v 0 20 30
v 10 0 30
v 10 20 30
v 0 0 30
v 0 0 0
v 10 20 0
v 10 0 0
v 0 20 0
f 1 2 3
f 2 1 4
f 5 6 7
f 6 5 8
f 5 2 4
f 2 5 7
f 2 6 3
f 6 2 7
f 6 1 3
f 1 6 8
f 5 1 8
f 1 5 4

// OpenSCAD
// Generated by SolidPython 1.1.3 on 2022-06-05 14:33:14
$fn = 48;


color(alpha = 1.0000000000, c = "red") {
	cube(size = [10, 20, 30]);
}
/***********************************************
*********      SolidPython code:      **********
************************************************
 
import subprocess

from solid.objects import *
from solid import scad_render_to_file

##################################################################################################################################################
##################################################################################################################################################
##################################################################################################################################################
##################################################################################################################################################
######  DIMENSION STUFF
##################################################################################################################################################
##################################################################################################################################################
##################################################################################################################################################
##################################################################################################################################################


mode = "3DPR"
#mode = "LAZE"
#mode = "TURE"
#mode = ""


######  Countersunk
countersunkM = []
WIDTH = 0
DEPTH = 1
countersunkM1width = 0; countersunkM1depth = 0; countersunkM2width = 0; countersunkM2depth = 0
countersunkM3width = 0
countersunkM3depth = 0
countersunkM4width = 0
countersunkM4depth = 0
countersunkM5width = 0
countersunkM5depth = 0
countersunkM6width = 0
countersunkM6depth = 0

######  Holes
holeM = []
holeM1 = 0
holeM2 = 0
holeM3 = 0
holeM4 = 0
holeM5 = 0
holeM6 = 0

######  Nuts
nutM = []
NUTWIDTH = 0
NUTDEPTH = 1
nutM1width = 0
nutM1depth = 0
nutM2width = 0
nutM2depth = 0
nutM3width = 0
nutM3depth = 0
nutM4width = 0
nutM4depth = 0
nutM5width = 0
nutM5depth = 0
nutM6width = 0
nutM6depth = 0

######  OOEB
ooebPinWidth = 0


######  Colors
colDefault = "Gold"

colOOEBbase = colDefault

colLEDRed = "red"
colWire = "gray"
    ######  Resistor
colRes = list()
colResistor = "beige"

colResBlack = "black"
colRes.append(colResBlack)
colResBrown = "brown"
colRes.append(colResBrown)
colResRed = "red"
colRes.append(colResRed)
colResOrange = "orange"
colRes.append(colResOrange)
colResYellow = "yellow"
colRes.append(colResYellow)
colResGreen = "green"
colRes.append(colResGreen)
colResBlue = "blue"
colRes.append(colResBlue)
colResPurple = "purple"
colRes.append(colResPurple)
colResGray = "gray"
colRes.append(colResGray)
colResWhite = "white"
colRes.append(colResWhite)





def changeMode(m="3DPR"):
    #print("####################################################      CHANGING MODES TO: " + m)
    global mode
    mode = m
    ######  Countersunk
    global countersunkM, countersunkM1width, countersunkM1depth, countersunkM2width, countersunkM2depth, countersunkM3width, countersunkM3depth, countersunkM4width, countersunkM4depth, countersunkM5width, countersunkM5depth, countersunkM6width, countersunkM6depth
    countersunkM = []
    countersunkM.append([0,0])
    countersunkM1width = 0 if mode== "3DPR" else 0
    countersunkM1depth = 0 if mode== "3DPR" else 0
    countersunkM.append([countersunkM1width,countersunkM1depth])
    countersunkM2width = 0 if mode== "3DPR" else 0
    countersunkM2depth = 0 if mode== "3DPR" else 0
    countersunkM.append([countersunkM2width,countersunkM2depth])
    countersunkM3width = 5.5/2+0.6 if mode== "3DPR" else 5.5/2
    countersunkM3depth = 1.7 if mode== "3DPR" else 1.7
    countersunkM.append([countersunkM3width,countersunkM3depth])
    countersunkM4width = 0 if mode== "3DPR" else 0
    countersunkM4depth = 0 if mode== "3DPR" else 0
    countersunkM.append([countersunkM4width,countersunkM4depth])
    countersunkM5width = 0 if mode== "3DPR" else 0
    countersunkM5depth = 0 if mode== "3DPR" else 0
    countersunkM.append([countersunkM5width,countersunkM5depth])
    countersunkM6width = 0 if mode== "3DPR" else 0
    countersunkM6depth = 0 if mode== "3DPR" else 0
    countersunkM.append([countersunkM6width,countersunkM6depth])
    ######  Holes
    global holeM, holeM1, holeM2, holeM3, holeM4, holeM5, holeM6, holeM7, holeM8
    holeM = []
    holeM1 = 1.2/2 if mode== "3DPR" else 1/2
    holeM2 = 2.3/2 if mode== "3DPR" else 2/2
    holeM3 = 3.4/2 if mode== "3DPR" else 3/2
    holeM4 = 4.4/2 if mode== "3DPR" else 4/2
    holeM5 = 5.4/2 if mode== "3DPR" else 5/2
    holeM6 = 6.5/2 if mode== "3DPR" else 6/2
    holeM7 = 7.5/2 if mode== "3DPR" else 7/2
    holeM8 = 8.6/2 if mode== "3DPR" else 8/2
    holeM.append(0)
    holeM.append(holeM1)
    holeM.append(holeM2)
    holeM.append(holeM3)
    holeM.append(holeM4)
    holeM.append(holeM5)
    holeM.append(holeM6)
    holeM.append(holeM7)
    holeM.append(holeM8)
    #####  Nuts
    global nutM, nutM1width, nutM1depth, nutM2width, nutM2depth, nutM3width, nutM3depth, nutM4width, nutM4depth, nutM5width, nutM5depth, nutM6width, nutM6depth
    nutM = []
    nutM.append([0,0]) 
    #M1 Nut
    nutM1width = 0
    nutM1depth = 0
    nutM.append([nutM1width,nutM1depth])    
    #M2 Nut
    nutM2width = 0
    nutM2depth = 0
    nutM.append([nutM2width,nutM2depth])    
    #M3 Nut
    nutM3width = 6.05 if mode== "3DPR" else 5.5
    nutM3depth = 2.5 if mode== "3DPR" else 2.5
    nutM.append([nutM3width,nutM3depth])    
    #M4 Nut
    nutM4width = 0
    nutM4depth = 0
    nutM.append([nutM4width,nutM4depth])    
    #M5 Nut
    nutM5width = 0
    nutM5depth = 0
    nutM.append([nutM5width,nutM5depth])    
    #M6 Nut
    nutM6width = 11 if mode== "3DPR" else 10
    nutM6depth = 5 if mode== "3DPR" else 5
    nutM.append([nutM6width,nutM6depth])    

    ######  OOEB
    global ooebPinWidth

    ooebPinWidth = 0.6
    if(mode=="3DPR" or mode=="LAZE"):
        ooebPinWidth = 0.6 + 0.6


changeMode()


""""    
holeM12D = s=="3DPR" ? 1.4/2 : 1.2/2;
holeM16D = s=="3DPR" ? 1.8/2 : 1.6/2;
holeM2 = s=="3DPR" ? 2.3/2 : 2/2;
holeM25D = s=="3DPR" ? 2.8/2 : 2.5/2;
holeM27D = s=="3DPR" ? 3.1/2 : 2.7/2;    
holeM3 = s=="3DPR" ? 3.4/2 : 3/2;
holeM35D = s=="3DPR" ? 3.9/2 : 35/2;
holeM4 = s=="3DPR" ? 4.4/2 : 4/2;
holeM5 = s=="3DPR" ? 5.4/2 : 5/2;
holeM6 = s=="3DPR" ? 6.5/2 : 6/2;
holeM6Minus = s=="3DPR" ? 5.8/2 : 5.9/2;
holeM7 = s=="3DPR" ? 7.5/2 : 7/2;
holeM8 = s=="3DPR" ? 8.6/2 : 8/2;
holeM9 = s=="3DPR" ? 9.6/2 : 9/2;
holeM10 = s=="3DPR" ? 10.6/2 : 10/2;
holeM11 = s=="3DPR" ? 11.6/2 : 11/2;
holeM12 = s=="3DPR" ? 12.6/2 : 12/2;
holeM13 = s=="3DPR" ? 13.6/2 : 13/2;
holeM14 = s=="3DPR" ? 14.6/2 : 14/2;
holeM15 = s=="3DPR" ? 15.6/2 : 15/2;
holeM16 = s=="3DPR" ? 16.6/2 : 16/2;
holeM17 = s=="3DPR" ? 17.6/2 : 17/2;
holeM18 = s=="3DPR" ? 18.6/2 : 18/2;
holeM19 = s=="3DPR" ? 19.6/2 : 19/2;
holeM20 = s=="3DPR" ? 20.6/2 : 20/2;
"""

##################################################################################################################################################
##################################################################################################################################################
##################################################################################################################################################
##################################################################################################################################################
######  REGULAR STUFF
##################################################################################################################################################
##################################################################################################################################################
##################################################################################################################################################
##################################################################################################################################################


def setMode(mode="3DPR"):
    changeMode(mode)

def getMode():
    return mode



def saveToScad(fileName, parts):
    file_out = scad_render_to_file(parts, fileName, file_header=f'$fn = 48;')


def saveToDxf(fileIn, fileOut=""):
    if fileOut == "":
        fileOut = fileIn.replace(".scad",".dxf")
    saveToFile(fileIn, fileOut)
    
def saveToPng(fileIn, fileOut="",extra="--render"):
    if fileOut == "":
        fileOut = fileIn.replace(".scad",".png")
    saveToFile(fileIn, fileOut)

def saveToStl(fileIn, fileOut=""):
    if fileOut == "":
        fileOut = fileIn.replace(".scad",".stl")
    saveToFile(fileIn, fileOut)

def saveToFile(fileIn, fileOut,extra=""):


    launchStr = 'openscad -o "' + fileOut + '"' + extra + ' "' + fileIn + '"'
    print("saveToFile launch string: " + launchStr)
    subprocess.run(launchStr)
    x=0



def insert(item,pos=[None,None,None],x=0,y=0,z=0,ex=0,size=[None,None,None],length=0,rot=[None,None,None],rotX=0,rotY=0,rotZ=0,width=0,height=0,depth=100,rad=0,rad2=0,color=colDefault,alpha=1,OOwidth=0,OOheight=0,holes=True,negative=True, name=""):
    return OPSCInsert(item,pos,x,y,z,ex,size,length,rot,rotX,rotY,rotZ,width,height,depth,rad,rad2,color,alpha,OOwidth,OOheight,holes,negative,name)


def OPSCInsert(item,pos=[None,None,None],x=0,y=0,z=0,ex=0,size=[None,None,None],length=0,rot=[None,None,None],rotX=0,rotY=0,rotZ=0,width=0,height=0,depth=100,rad=0,rad2=0,col=colDefault,alpha=1,OOwidth=0,OOheight=0,holes=True,negative=True, name=""):
    
    """
        color(color,alpha){
            translate([x,y,z]){
                    rotate([rotX,rotY,rotZ]){
    """
    returnValue = ""

    #print(pos)

    if pos[0] != None:
        x=pos[0]
        y=pos[1]
        z=pos[2]
    if rot[0] != None:
        rotX=rot[0]
        rotY=rot[1]
        rotZ=rot[2]
    
    returnValue = color(col)(translate((x,y,z))(
                            rotate((rotX,rotY,rotZ))(
                                OPSCInsertIf(item,pos,x,y,z,ex,size,length,rot,rotX,rotY,rotZ,width,height,depth,rad,rad2,col,alpha,OOwidth,OOheight,holes,negative,name)
                            )
                        ))
                
    

    return returnValue

def OPSCInsertIf(item,pos=[None,None,None],x=0,y=0,z=0,ex=0,size=[None,None,None],length=0,rot=[None,None,None],rotX=0,rotY=0,rotZ=0,width=0,height=0,depth=100,rad=0,rad2=0,color=colDefault,alpha=1,OOwidth=0,OOheight=0,holes=True,negative=True, name=""):
    returnValue = cube([10,10,10])

    if size[0] != None:
        width=size[0]
        height=size[1]
        depth=size[2]

    #print("    OPSCInsert item:" + str(item) + " at:[" + str(x) + "," + str(y) + "," + str(z) + "] size: [" + str(width) + "," + str(height) + "," + str(depth) + "]")

    if(item=="cube"):
        returnValue =  translate([0,0,-depth/2])(cube([width,height,depth],center=True))
    elif(item=="cylinder"):        
        returnValue = translate([0,0,-depth/2])(cylinder(r=rad,h=depth,center=True))
    elif(item=="sphere"):        
        returnValue = translate([0,0,-rad])(sphere(r=rad))
    elif(item=="plane"):
        returnValue = insert("cube",size=[1000,1000,0.1],color=color)    
    elif(item=="cubeRounded"):
        if(rad == 0):
                            rad = 5
        returnValue =  translate([0,0,-depth])(
                        linear_extrude(height=depth)(                        
                            offset(r=rad)(
                                square((width-rad*2+.01,height-rad*2+.01),center=True)
                                )
                            )
        )
    ######  Countersunk
    elif(item == "countersunkM1" or item == "csM1" ):
        returnValue = OSPCgetCountersunk(rad=1)
    elif(item == "countersunkM2" or item == "csM2" ):
        returnValue = OSPCgetCountersunk(rad=2)
    elif(item == "countersunkM3" or item == "csM3" ):
        returnValue = OSPCgetCountersunk(rad=3)
    elif(item == "countersunkM4" or item == "csM4" ):
        returnValue = OSPCgetCountersunk(rad=4)
    elif(item == "countersunkM5" or item == "csM5" ):
        returnValue = OSPCgetCountersunk(rad=5)
    elif(item == "countersunkM6" or item == "csM6" ):
        returnValue = OSPCgetCountersunk(rad=6)
    elif(item == "countersunk" or item == "cs"):
        returnValue = OSPCgetCountersunk(rad=rad)


    ######  Holes    
    elif(item == "holeM1"):
        returnValue = OSPCgetHole(rad=1)
    elif(item == "holeM2"):
        returnValue = OSPCgetHole(rad=2)
    elif(item == "holeM3"):
        returnValue = OSPCgetHole(rad=3)
    elif(item == "holeM4"):
        returnValue = OSPCgetHole(rad=4)
    elif(item == "holeM5"):
        returnValue = OSPCgetHole(rad=5)
    elif(item == "holeM6"):
        returnValue = OSPCgetHole(rad=6)
    elif(item == "hole"):
        returnValue = OSPCgetHole(rad=rad)

    ######  Nuts
    elif(item == "nutM1"):
        returnValue = OSPCgetNut(rad=1,depth=depth)
    elif(item == "nutM2"):
        returnValue = OSPCgetNut(rad=2,depth=depth)
    elif(item == "nutM3"):
        returnValue = OSPCgetNut(rad=3,depth=depth)
    elif(item == "nutM4"):
        returnValue = OSPCgetNut(rad=4,depth=depth)
    elif(item == "nutM5"):
        returnValue = OSPCgetNut(rad=5,depth=depth)
    elif(item == "nutM6"):
        returnValue = OSPCgetNut(rad=6,depth=depth)
    elif(item == "nut"):
        returnValue = OSPCgetNut(rad=rad,depth=depth)
    return returnValue

                

def OSPCgetHole(rad):
    return translate([0,0,-250])(cylinder(r=holeM[rad],h=500))

def OSPCgetNut(rad,depth):
    depth = nutM[rad][NUTDEPTH] if depth==100 else depth
    returnValue = OPSChexagon(nutM[rad][NUTWIDTH],depth=depth)
    return returnValue

def OSPCgetCountersunk(rad):
    depth=countersunkM[rad][DEPTH]
    returnValue = translate([0,0,-depth])(cylinder(h=depth,r2=countersunkM[rad][WIDTH],r1=holeM[rad]))
    return returnValue

def OPSChexagon(width,depth):
    cutter = item()
    wid=width*2
    cutter.addPos(insert("cube",pos=[wid/2+width/2,0,0],size=[wid,wid,depth]))
    cutter.addPos(insert("cube",pos=[-wid/2-width/2,0,0],size=[wid,wid,depth]))

    cut = cutter.getPart()
    #print(depth)
    returnValue = difference()(
        translate([0,0,-depth/2])(cube([wid,wid,depth],center=True)),
        cut,
        rotate([0,0,60])(cut),
        rotate([0,0,-60])(cut)
    )

    return returnValue




class item:

    def __init__(self):
        self.posItems=list()
        self.negItems=list()


    def addPos(self,part):
        self.posItems.append(part)
    def addNeg(self,part):
        self.negItems.append(part)

    def getPart(self):
        returnValue = difference()(
            union()(self.posItems),
            union()(self.negItems)
        )
        return returnValue

    def getLaser(self,start=0,layers=1,thickness=-3,tileDif=200):
        rv= []

        for x in range(layers):
            rv.append(translate([0,x*tileDif,0])(
                    projection()(
                        intersection()(
                            insert("plane",z=start+x*thickness),
                            self.getPart()
                        )
                    )
            )
            )
        return union()(rv)

    def getSplit(self,start=0,depth=6,tileDif=200):
        rv= []

        rv.append(translate([0,0,0])(
            intersection()(
                insert("cube",size=[100,100,depth],z=start),
                self.getPart()
            )
        )
        )

        rv.append(translate([0,tileDif,depth])(
            intersection()(
                insert("cube",size=[100,100,depth],z=start-depth),
                self.getPart()
            )
        )
        )        
        return union()(rv)


 
 
************************************************/
